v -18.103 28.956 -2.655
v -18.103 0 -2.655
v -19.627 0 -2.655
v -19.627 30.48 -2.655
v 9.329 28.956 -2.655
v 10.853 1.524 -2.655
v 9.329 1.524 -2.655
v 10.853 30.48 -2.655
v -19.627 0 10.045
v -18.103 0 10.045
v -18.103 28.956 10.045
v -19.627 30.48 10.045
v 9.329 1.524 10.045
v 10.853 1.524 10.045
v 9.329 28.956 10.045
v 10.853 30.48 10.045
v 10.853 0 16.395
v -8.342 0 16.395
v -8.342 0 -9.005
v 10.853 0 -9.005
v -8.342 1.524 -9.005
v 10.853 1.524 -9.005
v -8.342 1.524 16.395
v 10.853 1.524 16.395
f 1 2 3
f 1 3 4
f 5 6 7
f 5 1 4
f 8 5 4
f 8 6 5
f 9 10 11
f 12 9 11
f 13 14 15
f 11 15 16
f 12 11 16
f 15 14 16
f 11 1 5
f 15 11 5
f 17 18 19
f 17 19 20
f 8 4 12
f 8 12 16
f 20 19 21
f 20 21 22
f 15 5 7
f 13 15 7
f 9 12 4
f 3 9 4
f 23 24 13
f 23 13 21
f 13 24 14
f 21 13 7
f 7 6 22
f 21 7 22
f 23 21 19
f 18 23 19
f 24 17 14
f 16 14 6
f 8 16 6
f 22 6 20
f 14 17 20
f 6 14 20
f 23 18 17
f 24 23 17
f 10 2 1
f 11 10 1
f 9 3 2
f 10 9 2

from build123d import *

# Parameters (mm, degrees)
SKETCH1_W               = 30.48
SKETCH1_H               = 25.4
BOSS_EXTRUDE1_DEPTH     = 30.48
SKETCH5_W               = 6.35
SKETCH5_H               = 28.956
CUT_EXTRUDE4_DEPTH      = 47.117696394
CUT_EXTRUDE5_DEPTH      = 40.787452235
CUT_EXTRUDE5_DEPTH_BACK = 40.787452235
SKETCH7_W               = 6.35
SKETCH7_H               = 1.524
CUT_EXTRUDE6_DEPTH      = 31.75


with BuildPart() as part:
    # Sketch1 → Boss-Extrude1 (new body)
    with BuildSketch(Plane(origin=(0, 0, 0), x_dir=(1, 0, 0), z_dir=(0, 1, 0))):
        with Locations((-4.387272727, -3.694545455)):
            Rectangle(SKETCH1_W, SKETCH1_H)
    extrude(amount=BOSS_EXTRUDE1_DEPTH)

    # Sketch5 → Cut-Extrude4 (cut, through all)
    with BuildSketch(Plane(origin=(10.852727273, 0, 0), x_dir=(0, 0, -1), z_dir=(1, 0, 0))):
        with Locations((-13.219545455, 16.002)):
            Rectangle(SKETCH5_W, SKETCH5_H)
        with Locations((5.830454545, 16.002)):
            Rectangle(SKETCH5_W, SKETCH5_H)
    extrude(amount=-CUT_EXTRUDE4_DEPTH, mode=Mode.SUBTRACT)

    # Sketch6 → Cut-Extrude5 (cut, two sides: drawn at the far end of the back side and taken through both)
    with BuildSketch(Plane.XY.offset(-CUT_EXTRUDE5_DEPTH_BACK)):
        Polygon((-18.103272727, 0), (-18.103272727, 28.956), (9.328727273, 28.956), (9.328727273, 1.524), (-8.342365858, 1.524), (-8.342365858, 0), align=None)
    extrude(amount=CUT_EXTRUDE5_DEPTH + CUT_EXTRUDE5_DEPTH_BACK, mode=Mode.SUBTRACT)

    # Sketch7 → Cut-Extrude6 (cut)
    with BuildSketch(Plane(origin=(-18.103272727, 0, 0), x_dir=(0, 0, -1), z_dir=(1, 0, 0))):
        with Locations((-13.219545455, 0.762)):
            Rectangle(SKETCH7_W, SKETCH7_H)
        with Locations((5.830454545, 0.762)):
            Rectangle(SKETCH7_W, SKETCH7_H)
    extrude(amount=-CUT_EXTRUDE6_DEPTH, mode=Mode.SUBTRACT)


solid = part.part
